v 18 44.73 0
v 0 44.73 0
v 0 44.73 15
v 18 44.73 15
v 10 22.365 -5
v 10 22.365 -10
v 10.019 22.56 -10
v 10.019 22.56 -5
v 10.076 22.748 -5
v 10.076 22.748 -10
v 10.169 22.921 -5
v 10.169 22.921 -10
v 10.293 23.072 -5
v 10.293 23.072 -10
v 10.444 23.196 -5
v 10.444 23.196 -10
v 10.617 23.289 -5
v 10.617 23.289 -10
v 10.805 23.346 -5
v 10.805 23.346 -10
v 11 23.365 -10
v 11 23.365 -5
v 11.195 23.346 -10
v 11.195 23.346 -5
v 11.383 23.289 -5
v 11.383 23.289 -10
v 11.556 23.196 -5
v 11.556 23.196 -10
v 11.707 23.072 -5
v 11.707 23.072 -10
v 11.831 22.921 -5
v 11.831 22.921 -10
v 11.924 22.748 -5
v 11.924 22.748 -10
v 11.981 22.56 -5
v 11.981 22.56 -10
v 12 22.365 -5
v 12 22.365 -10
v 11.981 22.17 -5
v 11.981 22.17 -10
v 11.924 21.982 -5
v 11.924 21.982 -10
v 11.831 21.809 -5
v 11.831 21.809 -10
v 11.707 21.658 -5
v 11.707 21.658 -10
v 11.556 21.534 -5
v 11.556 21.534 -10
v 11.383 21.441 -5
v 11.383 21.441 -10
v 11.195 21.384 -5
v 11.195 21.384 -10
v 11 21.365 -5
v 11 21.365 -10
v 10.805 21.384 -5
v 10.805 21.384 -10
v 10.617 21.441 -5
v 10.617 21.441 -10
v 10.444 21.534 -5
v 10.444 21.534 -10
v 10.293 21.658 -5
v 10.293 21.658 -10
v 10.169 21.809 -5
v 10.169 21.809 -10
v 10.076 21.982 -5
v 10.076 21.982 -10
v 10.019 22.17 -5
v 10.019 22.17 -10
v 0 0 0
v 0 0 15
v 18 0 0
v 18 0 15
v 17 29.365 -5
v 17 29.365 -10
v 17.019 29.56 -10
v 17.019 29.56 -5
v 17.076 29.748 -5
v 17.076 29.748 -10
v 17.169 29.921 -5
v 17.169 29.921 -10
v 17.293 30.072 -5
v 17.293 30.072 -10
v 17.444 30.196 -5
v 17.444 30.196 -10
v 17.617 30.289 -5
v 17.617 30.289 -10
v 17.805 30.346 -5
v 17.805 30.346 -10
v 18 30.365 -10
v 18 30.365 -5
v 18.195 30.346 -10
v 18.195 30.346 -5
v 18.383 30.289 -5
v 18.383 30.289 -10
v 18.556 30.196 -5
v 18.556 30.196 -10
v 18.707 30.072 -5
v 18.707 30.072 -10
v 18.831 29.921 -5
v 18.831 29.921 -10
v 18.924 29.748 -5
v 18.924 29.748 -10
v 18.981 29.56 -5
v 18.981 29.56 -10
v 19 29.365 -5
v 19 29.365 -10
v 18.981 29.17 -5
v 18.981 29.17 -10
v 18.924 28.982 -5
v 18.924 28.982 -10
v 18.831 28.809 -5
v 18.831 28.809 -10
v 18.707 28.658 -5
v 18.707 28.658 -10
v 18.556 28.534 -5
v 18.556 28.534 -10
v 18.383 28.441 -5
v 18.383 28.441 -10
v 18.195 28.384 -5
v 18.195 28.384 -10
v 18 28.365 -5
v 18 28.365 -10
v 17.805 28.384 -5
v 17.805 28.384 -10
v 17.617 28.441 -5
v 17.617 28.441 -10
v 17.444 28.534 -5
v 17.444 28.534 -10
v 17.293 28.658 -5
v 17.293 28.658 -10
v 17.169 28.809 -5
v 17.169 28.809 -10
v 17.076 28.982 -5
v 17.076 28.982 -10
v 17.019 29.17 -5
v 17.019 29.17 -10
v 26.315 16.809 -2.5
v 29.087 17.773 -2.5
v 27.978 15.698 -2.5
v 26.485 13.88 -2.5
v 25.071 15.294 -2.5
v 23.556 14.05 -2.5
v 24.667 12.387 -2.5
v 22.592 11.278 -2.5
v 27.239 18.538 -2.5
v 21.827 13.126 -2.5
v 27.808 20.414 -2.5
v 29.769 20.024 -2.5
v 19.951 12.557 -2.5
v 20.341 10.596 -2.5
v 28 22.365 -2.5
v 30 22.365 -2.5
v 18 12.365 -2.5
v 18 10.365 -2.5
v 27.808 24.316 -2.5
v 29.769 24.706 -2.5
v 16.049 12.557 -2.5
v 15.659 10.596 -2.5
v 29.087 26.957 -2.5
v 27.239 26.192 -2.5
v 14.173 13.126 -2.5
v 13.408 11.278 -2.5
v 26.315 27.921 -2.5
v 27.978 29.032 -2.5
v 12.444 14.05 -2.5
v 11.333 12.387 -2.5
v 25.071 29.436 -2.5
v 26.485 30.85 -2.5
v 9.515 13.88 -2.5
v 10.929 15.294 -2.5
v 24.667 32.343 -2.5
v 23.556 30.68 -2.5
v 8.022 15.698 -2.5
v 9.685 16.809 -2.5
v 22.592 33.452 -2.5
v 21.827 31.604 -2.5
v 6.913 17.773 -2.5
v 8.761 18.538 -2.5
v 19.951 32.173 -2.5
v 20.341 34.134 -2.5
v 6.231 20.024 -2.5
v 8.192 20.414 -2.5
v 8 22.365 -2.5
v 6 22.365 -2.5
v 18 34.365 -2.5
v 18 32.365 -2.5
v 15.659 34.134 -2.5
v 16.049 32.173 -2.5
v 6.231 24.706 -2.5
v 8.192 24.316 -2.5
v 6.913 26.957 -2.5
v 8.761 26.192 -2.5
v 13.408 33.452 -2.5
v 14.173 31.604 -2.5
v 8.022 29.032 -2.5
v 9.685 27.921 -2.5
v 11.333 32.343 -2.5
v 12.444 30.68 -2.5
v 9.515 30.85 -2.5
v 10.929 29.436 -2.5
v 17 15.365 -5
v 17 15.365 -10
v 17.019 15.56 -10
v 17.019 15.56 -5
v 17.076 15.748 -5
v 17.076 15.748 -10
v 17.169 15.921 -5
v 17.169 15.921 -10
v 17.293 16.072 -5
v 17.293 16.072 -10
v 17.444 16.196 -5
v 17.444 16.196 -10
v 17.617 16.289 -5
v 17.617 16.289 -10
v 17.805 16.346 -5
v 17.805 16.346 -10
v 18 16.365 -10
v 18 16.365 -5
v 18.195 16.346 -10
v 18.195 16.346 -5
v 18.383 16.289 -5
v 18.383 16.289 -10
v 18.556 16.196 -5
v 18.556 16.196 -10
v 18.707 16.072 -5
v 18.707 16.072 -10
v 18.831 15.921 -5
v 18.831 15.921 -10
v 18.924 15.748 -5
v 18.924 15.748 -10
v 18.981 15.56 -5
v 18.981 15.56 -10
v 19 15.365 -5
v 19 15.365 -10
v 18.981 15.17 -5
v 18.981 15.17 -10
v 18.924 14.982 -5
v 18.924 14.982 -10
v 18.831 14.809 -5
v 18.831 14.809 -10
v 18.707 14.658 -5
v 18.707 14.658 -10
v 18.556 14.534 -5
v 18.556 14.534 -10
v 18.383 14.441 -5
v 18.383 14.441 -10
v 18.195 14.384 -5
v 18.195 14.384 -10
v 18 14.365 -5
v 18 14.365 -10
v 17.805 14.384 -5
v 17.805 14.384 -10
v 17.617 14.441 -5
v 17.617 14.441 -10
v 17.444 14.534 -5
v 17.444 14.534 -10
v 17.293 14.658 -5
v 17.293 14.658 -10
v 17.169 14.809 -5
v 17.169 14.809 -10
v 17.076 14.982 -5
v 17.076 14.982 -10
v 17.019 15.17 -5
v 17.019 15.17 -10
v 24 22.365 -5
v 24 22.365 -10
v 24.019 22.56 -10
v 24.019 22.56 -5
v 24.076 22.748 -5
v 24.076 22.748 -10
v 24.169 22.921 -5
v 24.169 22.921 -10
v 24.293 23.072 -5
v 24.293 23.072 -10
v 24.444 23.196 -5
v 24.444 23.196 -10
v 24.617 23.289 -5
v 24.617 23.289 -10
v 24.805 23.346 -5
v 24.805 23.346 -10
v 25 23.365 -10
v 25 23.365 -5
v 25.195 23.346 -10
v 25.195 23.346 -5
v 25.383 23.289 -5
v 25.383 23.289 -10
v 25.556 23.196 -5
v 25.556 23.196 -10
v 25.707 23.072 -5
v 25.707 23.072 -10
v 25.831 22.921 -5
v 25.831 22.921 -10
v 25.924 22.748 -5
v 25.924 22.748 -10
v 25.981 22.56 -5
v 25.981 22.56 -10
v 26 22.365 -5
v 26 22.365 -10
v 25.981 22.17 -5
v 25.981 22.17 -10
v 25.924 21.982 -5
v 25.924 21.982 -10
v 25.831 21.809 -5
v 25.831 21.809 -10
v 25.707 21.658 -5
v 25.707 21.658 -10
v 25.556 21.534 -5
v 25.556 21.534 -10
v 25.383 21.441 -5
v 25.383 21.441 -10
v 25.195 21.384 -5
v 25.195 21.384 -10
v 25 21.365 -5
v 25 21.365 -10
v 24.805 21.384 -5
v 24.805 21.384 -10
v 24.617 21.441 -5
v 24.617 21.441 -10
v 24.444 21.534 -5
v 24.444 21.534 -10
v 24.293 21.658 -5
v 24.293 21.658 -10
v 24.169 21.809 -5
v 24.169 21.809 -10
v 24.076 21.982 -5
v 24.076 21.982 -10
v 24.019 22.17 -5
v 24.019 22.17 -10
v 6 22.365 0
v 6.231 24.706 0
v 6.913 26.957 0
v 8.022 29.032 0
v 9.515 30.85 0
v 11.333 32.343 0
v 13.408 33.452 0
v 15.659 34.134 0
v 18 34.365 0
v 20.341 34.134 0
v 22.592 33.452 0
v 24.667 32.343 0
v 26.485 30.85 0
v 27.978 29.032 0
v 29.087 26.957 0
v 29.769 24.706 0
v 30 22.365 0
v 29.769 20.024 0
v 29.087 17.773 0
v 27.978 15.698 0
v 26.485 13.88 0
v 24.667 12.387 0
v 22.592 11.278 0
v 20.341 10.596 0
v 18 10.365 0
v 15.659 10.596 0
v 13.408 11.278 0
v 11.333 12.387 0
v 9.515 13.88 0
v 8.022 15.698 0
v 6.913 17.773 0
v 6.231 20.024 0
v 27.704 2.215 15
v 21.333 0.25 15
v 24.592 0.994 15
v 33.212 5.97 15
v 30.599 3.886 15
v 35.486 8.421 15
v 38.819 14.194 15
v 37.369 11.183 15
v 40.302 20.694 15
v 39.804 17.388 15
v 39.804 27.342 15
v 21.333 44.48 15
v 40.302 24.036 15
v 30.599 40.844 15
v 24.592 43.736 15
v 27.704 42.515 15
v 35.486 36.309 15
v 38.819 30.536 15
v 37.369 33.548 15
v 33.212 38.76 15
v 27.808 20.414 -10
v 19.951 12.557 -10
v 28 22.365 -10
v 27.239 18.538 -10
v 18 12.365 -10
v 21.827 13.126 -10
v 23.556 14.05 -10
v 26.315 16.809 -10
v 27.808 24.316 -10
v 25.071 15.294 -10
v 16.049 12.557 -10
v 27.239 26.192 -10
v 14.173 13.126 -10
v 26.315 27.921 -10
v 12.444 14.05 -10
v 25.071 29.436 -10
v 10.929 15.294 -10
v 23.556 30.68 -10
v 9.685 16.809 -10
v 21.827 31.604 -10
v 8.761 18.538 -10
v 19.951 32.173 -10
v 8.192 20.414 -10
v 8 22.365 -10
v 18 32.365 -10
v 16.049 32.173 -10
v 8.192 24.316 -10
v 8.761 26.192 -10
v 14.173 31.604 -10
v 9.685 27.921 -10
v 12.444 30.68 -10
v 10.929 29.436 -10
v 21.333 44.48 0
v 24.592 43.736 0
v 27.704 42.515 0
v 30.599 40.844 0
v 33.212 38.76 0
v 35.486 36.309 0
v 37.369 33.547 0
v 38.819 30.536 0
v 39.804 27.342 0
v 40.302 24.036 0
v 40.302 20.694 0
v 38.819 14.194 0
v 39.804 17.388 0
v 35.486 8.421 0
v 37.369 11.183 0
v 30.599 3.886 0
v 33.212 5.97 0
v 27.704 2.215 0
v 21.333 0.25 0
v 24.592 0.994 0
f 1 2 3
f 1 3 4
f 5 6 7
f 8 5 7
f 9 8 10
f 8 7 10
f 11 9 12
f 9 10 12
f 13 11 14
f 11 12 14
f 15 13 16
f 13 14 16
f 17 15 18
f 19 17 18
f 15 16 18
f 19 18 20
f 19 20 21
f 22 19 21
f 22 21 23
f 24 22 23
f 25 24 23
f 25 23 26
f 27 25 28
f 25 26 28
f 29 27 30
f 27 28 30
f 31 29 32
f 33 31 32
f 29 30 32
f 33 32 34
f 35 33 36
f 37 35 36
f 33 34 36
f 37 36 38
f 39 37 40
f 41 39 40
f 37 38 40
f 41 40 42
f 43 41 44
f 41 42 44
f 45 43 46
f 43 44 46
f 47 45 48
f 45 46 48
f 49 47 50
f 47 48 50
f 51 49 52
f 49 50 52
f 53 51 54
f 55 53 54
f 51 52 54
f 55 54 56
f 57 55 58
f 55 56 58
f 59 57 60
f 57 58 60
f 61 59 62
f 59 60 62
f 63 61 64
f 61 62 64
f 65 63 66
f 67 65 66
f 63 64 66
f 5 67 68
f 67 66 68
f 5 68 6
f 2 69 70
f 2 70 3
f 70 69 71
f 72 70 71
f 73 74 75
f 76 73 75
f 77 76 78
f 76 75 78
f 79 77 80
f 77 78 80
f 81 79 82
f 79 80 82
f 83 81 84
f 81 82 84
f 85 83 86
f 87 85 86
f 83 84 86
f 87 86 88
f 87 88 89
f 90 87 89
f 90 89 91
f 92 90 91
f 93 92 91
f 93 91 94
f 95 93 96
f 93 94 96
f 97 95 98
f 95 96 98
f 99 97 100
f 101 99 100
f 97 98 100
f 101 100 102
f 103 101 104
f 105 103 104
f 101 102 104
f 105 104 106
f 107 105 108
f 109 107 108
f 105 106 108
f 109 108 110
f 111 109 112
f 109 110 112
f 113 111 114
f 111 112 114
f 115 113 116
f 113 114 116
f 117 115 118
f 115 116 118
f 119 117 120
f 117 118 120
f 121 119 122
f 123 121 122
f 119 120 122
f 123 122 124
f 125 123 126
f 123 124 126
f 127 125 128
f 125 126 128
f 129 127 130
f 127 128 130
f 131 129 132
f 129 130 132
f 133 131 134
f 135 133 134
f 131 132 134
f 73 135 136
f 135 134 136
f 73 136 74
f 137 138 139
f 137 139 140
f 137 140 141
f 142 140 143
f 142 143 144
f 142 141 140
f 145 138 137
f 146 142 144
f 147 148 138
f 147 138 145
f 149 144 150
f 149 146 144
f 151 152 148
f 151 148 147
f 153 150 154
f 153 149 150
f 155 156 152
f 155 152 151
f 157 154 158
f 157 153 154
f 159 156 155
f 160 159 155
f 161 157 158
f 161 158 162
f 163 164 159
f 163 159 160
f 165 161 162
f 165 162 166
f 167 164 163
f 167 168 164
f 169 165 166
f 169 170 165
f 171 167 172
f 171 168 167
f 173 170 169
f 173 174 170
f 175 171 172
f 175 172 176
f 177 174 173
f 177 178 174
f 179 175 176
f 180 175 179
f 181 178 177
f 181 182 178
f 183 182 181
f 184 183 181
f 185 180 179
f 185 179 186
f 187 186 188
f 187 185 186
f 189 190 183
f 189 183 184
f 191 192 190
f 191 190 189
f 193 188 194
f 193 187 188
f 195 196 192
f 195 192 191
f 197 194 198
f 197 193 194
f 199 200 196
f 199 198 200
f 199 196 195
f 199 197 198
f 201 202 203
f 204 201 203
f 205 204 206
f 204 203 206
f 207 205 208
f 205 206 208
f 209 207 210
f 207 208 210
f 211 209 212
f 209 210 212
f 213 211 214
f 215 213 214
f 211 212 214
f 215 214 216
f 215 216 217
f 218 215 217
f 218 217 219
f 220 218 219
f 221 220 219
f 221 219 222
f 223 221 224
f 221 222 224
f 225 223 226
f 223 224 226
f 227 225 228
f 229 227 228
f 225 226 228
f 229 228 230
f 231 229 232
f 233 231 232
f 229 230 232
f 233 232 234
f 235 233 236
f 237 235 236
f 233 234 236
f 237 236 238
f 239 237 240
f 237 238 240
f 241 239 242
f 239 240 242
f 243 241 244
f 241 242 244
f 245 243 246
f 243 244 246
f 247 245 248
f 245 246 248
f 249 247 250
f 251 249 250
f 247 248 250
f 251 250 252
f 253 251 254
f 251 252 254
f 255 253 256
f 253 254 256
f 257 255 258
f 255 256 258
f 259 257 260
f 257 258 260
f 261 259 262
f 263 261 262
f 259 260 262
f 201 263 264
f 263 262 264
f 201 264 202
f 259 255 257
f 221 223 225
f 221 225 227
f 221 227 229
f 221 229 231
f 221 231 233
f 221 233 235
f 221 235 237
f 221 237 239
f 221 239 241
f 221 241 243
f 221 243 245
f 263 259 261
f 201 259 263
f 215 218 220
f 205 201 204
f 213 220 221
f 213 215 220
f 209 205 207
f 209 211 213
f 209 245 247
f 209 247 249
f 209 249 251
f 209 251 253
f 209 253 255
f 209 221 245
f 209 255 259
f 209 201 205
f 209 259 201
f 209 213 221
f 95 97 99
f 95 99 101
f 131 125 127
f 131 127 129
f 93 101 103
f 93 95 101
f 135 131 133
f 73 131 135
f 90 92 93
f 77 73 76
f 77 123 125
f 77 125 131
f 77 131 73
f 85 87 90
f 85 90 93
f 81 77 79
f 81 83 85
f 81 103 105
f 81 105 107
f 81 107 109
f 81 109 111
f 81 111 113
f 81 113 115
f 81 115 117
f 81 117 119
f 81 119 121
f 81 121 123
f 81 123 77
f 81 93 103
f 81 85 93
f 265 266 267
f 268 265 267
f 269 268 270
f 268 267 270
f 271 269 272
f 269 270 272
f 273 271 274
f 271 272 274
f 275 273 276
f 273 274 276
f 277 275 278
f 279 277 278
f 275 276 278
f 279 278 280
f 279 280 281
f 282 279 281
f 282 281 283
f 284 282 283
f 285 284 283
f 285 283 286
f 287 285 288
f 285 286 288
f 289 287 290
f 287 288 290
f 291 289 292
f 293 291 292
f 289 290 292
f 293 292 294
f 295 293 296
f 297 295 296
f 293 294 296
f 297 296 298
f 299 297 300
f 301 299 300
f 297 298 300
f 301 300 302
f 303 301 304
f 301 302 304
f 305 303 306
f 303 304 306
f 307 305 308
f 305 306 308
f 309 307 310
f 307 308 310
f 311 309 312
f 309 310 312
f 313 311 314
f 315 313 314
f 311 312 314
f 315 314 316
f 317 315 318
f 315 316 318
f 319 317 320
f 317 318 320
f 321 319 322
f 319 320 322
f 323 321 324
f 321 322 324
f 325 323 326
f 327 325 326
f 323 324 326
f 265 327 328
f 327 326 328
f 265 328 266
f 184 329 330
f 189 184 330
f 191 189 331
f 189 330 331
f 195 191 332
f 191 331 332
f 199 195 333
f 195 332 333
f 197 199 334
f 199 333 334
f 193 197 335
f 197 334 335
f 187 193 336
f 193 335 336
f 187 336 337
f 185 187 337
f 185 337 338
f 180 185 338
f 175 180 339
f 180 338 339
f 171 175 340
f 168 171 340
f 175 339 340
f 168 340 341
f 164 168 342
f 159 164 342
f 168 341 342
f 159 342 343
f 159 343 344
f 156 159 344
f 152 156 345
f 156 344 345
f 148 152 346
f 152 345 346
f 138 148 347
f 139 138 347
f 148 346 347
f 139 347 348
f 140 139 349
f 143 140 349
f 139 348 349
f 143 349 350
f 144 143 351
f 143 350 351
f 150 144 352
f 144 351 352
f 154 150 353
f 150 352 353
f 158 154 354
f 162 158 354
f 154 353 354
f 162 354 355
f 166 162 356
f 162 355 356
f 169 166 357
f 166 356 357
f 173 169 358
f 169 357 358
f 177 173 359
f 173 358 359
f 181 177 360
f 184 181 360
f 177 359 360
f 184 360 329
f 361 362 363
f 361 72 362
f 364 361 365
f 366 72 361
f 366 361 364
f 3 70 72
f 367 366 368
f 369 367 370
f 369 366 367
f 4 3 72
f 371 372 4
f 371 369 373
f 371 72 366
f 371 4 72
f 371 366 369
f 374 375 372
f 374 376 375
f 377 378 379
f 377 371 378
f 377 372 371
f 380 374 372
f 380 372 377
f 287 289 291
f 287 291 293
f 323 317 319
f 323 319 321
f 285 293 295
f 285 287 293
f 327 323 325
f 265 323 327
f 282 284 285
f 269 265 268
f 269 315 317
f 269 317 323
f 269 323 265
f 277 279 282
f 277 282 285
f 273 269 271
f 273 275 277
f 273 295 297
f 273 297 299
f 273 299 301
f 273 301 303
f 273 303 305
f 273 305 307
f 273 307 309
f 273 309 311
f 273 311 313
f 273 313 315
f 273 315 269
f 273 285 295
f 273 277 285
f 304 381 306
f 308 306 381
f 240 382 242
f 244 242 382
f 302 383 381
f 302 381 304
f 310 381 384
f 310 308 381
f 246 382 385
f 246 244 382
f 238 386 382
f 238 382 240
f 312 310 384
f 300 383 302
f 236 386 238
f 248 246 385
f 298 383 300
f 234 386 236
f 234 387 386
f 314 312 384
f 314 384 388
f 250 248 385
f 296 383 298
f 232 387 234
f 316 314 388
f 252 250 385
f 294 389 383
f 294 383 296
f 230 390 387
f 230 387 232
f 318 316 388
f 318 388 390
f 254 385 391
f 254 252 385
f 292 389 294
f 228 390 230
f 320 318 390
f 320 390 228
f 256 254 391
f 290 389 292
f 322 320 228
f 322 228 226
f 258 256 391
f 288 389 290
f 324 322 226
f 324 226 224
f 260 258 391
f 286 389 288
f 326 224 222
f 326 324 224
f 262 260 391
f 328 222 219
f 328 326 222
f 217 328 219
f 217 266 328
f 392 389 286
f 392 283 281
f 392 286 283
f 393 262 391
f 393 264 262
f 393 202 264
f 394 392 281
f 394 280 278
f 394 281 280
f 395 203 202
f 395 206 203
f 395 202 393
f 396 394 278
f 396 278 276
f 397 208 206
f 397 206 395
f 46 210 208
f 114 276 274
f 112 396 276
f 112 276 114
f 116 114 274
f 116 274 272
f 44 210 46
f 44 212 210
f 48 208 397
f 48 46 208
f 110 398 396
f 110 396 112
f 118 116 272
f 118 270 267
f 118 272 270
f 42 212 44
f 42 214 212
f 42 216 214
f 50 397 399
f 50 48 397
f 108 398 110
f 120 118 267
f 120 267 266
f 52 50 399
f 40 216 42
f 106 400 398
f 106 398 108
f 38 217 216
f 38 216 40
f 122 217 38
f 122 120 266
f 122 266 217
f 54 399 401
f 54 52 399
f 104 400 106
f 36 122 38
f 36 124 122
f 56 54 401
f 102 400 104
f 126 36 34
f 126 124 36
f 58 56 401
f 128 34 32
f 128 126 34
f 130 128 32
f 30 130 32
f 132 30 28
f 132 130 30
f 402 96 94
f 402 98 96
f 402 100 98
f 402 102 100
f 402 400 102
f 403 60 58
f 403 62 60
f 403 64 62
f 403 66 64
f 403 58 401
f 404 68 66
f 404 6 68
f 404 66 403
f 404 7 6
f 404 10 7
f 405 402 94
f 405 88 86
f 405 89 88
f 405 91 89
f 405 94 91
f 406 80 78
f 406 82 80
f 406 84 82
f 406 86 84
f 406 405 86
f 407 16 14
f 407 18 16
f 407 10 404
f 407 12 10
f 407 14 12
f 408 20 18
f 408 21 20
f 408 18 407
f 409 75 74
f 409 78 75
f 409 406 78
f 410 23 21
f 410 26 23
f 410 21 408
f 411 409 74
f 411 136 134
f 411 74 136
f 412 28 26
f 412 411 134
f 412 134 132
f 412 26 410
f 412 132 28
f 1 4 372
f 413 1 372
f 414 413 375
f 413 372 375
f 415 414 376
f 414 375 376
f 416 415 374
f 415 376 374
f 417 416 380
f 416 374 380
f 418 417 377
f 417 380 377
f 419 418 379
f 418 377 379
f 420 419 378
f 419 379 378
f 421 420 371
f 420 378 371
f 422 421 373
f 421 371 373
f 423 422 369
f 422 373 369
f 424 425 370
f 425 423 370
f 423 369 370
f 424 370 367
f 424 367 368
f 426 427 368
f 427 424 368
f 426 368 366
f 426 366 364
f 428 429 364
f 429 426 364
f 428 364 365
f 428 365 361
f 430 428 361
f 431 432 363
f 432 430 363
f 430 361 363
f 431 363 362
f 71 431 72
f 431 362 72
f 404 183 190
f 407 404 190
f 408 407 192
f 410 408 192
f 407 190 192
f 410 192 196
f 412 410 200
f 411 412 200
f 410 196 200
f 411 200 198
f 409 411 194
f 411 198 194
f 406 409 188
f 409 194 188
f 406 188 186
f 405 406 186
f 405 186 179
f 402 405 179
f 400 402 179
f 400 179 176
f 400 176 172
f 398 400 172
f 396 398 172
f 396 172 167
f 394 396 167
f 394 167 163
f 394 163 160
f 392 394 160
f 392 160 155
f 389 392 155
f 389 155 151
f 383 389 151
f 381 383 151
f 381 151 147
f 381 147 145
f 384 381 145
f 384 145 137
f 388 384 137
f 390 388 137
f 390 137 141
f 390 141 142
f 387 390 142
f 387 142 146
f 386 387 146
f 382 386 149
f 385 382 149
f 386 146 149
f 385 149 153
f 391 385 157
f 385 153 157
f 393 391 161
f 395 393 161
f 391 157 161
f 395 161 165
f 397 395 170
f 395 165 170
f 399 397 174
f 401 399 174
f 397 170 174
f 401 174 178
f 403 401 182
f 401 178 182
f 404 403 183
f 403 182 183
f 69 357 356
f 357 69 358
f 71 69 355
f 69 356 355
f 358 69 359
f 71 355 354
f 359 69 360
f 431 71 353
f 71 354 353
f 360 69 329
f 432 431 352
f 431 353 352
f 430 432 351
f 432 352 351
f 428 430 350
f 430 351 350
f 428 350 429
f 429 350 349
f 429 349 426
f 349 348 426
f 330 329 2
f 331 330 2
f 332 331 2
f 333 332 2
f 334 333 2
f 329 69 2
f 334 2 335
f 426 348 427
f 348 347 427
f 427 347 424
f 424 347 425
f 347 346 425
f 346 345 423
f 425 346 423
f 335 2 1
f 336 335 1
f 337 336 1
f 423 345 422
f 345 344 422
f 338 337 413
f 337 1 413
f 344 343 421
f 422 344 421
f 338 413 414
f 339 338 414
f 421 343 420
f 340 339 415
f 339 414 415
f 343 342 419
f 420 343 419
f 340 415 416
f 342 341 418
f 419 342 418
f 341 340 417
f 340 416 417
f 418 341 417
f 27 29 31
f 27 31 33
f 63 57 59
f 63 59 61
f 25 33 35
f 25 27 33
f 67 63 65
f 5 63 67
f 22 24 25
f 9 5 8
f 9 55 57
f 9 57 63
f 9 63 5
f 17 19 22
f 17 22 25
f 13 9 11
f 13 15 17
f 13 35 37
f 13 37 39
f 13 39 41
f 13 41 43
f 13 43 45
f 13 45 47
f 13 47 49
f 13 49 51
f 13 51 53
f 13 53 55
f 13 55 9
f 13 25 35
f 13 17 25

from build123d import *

# Parameters (mm, degrees)
SKETCH_1_W          = 189.06
SKETCH_1_H          = 44.73
EXTRUDE_1_DEPTH     = 15
CUT_EXTRUDE_4_REACH = 196.858
SKETCH_6_R          = 10
EXTRUDE_2_DEPTH     = 10
SKETCH_7_R          = 1
CUT_EXTRUDE_6_DEPTH = 5
SKETCH_8_R          = 12
SKETCH_8_R_2        = 10
EXTRUDE_3_DEPTH     = 2.5


with BuildPart() as part:
    # 草图1 → 凸台-拉伸1 (new body)
    with BuildSketch(Plane.XY):
        with Locations((94.53, 22.365)):
            Rectangle(SKETCH_1_W, SKETCH_1_H)
    extrude(amount=EXTRUDE_1_DEPTH)

    # 草图4 → 切除-拉伸4 (cut, up to next)
    with BuildSketch(Plane.XY.offset(15), mode=Mode.PRIVATE) as cut_extrude_4_sk1:
        with BuildLine():
            Line((189.06, 44.73), (18, 44.73))
            ThreePointArc((18, 44.73), (40.365, 22.365), (18, 0))
            Line((18, 0), (189.06, 0))
            Line((189.06, 0), (189.06, 44.73))
        make_face()
    cut_extrude_4_tool1 = extrude(cut_extrude_4_sk1.sketch, amount=-CUT_EXTRUDE_4_REACH, mode=Mode.PRIVATE) & part.part
    add(cut_extrude_4_tool1.solids().sort_by_distance((112.231547, 22.365, 15))[0], mode=Mode.SUBTRACT)

    # 草图6 → 凸台-拉伸2 (add)
    with BuildSketch(Plane(origin=(0, 0, 0), x_dir=(-1, 0, 0), z_dir=(0, 0, -1))):
        with Locations((-18, 22.365)):
            Circle(SKETCH_6_R)
    extrude(amount=EXTRUDE_2_DEPTH)

    # 草图7 → 切除-拉伸6 (cut)
    with BuildSketch(Plane(origin=(0, 0, -10), x_dir=(-1, 0, 0), z_dir=(0, 0, -1))):
        with Locations((-18, 29.365)):
            Circle(SKETCH_7_R)
        with Locations((-11, 22.365)):
            Circle(SKETCH_7_R)
        with Locations((-18, 15.365)):
            Circle(SKETCH_7_R)
        with Locations((-25, 22.365)):
            Circle(SKETCH_7_R)
    extrude(amount=-CUT_EXTRUDE_6_DEPTH, mode=Mode.SUBTRACT)

    # 草图8 → 凸台-拉伸3 (add)
    with BuildSketch(Plane(origin=(0, 0, 0), x_dir=(-1, 0, 0), z_dir=(0, 0, -1))):
        with Locations((-18, 22.365)):
            Circle(SKETCH_8_R)
        with Locations((-18, 22.365)):
            Circle(SKETCH_8_R_2, mode=Mode.SUBTRACT)
    extrude(amount=EXTRUDE_3_DEPTH)


solid = part.part
